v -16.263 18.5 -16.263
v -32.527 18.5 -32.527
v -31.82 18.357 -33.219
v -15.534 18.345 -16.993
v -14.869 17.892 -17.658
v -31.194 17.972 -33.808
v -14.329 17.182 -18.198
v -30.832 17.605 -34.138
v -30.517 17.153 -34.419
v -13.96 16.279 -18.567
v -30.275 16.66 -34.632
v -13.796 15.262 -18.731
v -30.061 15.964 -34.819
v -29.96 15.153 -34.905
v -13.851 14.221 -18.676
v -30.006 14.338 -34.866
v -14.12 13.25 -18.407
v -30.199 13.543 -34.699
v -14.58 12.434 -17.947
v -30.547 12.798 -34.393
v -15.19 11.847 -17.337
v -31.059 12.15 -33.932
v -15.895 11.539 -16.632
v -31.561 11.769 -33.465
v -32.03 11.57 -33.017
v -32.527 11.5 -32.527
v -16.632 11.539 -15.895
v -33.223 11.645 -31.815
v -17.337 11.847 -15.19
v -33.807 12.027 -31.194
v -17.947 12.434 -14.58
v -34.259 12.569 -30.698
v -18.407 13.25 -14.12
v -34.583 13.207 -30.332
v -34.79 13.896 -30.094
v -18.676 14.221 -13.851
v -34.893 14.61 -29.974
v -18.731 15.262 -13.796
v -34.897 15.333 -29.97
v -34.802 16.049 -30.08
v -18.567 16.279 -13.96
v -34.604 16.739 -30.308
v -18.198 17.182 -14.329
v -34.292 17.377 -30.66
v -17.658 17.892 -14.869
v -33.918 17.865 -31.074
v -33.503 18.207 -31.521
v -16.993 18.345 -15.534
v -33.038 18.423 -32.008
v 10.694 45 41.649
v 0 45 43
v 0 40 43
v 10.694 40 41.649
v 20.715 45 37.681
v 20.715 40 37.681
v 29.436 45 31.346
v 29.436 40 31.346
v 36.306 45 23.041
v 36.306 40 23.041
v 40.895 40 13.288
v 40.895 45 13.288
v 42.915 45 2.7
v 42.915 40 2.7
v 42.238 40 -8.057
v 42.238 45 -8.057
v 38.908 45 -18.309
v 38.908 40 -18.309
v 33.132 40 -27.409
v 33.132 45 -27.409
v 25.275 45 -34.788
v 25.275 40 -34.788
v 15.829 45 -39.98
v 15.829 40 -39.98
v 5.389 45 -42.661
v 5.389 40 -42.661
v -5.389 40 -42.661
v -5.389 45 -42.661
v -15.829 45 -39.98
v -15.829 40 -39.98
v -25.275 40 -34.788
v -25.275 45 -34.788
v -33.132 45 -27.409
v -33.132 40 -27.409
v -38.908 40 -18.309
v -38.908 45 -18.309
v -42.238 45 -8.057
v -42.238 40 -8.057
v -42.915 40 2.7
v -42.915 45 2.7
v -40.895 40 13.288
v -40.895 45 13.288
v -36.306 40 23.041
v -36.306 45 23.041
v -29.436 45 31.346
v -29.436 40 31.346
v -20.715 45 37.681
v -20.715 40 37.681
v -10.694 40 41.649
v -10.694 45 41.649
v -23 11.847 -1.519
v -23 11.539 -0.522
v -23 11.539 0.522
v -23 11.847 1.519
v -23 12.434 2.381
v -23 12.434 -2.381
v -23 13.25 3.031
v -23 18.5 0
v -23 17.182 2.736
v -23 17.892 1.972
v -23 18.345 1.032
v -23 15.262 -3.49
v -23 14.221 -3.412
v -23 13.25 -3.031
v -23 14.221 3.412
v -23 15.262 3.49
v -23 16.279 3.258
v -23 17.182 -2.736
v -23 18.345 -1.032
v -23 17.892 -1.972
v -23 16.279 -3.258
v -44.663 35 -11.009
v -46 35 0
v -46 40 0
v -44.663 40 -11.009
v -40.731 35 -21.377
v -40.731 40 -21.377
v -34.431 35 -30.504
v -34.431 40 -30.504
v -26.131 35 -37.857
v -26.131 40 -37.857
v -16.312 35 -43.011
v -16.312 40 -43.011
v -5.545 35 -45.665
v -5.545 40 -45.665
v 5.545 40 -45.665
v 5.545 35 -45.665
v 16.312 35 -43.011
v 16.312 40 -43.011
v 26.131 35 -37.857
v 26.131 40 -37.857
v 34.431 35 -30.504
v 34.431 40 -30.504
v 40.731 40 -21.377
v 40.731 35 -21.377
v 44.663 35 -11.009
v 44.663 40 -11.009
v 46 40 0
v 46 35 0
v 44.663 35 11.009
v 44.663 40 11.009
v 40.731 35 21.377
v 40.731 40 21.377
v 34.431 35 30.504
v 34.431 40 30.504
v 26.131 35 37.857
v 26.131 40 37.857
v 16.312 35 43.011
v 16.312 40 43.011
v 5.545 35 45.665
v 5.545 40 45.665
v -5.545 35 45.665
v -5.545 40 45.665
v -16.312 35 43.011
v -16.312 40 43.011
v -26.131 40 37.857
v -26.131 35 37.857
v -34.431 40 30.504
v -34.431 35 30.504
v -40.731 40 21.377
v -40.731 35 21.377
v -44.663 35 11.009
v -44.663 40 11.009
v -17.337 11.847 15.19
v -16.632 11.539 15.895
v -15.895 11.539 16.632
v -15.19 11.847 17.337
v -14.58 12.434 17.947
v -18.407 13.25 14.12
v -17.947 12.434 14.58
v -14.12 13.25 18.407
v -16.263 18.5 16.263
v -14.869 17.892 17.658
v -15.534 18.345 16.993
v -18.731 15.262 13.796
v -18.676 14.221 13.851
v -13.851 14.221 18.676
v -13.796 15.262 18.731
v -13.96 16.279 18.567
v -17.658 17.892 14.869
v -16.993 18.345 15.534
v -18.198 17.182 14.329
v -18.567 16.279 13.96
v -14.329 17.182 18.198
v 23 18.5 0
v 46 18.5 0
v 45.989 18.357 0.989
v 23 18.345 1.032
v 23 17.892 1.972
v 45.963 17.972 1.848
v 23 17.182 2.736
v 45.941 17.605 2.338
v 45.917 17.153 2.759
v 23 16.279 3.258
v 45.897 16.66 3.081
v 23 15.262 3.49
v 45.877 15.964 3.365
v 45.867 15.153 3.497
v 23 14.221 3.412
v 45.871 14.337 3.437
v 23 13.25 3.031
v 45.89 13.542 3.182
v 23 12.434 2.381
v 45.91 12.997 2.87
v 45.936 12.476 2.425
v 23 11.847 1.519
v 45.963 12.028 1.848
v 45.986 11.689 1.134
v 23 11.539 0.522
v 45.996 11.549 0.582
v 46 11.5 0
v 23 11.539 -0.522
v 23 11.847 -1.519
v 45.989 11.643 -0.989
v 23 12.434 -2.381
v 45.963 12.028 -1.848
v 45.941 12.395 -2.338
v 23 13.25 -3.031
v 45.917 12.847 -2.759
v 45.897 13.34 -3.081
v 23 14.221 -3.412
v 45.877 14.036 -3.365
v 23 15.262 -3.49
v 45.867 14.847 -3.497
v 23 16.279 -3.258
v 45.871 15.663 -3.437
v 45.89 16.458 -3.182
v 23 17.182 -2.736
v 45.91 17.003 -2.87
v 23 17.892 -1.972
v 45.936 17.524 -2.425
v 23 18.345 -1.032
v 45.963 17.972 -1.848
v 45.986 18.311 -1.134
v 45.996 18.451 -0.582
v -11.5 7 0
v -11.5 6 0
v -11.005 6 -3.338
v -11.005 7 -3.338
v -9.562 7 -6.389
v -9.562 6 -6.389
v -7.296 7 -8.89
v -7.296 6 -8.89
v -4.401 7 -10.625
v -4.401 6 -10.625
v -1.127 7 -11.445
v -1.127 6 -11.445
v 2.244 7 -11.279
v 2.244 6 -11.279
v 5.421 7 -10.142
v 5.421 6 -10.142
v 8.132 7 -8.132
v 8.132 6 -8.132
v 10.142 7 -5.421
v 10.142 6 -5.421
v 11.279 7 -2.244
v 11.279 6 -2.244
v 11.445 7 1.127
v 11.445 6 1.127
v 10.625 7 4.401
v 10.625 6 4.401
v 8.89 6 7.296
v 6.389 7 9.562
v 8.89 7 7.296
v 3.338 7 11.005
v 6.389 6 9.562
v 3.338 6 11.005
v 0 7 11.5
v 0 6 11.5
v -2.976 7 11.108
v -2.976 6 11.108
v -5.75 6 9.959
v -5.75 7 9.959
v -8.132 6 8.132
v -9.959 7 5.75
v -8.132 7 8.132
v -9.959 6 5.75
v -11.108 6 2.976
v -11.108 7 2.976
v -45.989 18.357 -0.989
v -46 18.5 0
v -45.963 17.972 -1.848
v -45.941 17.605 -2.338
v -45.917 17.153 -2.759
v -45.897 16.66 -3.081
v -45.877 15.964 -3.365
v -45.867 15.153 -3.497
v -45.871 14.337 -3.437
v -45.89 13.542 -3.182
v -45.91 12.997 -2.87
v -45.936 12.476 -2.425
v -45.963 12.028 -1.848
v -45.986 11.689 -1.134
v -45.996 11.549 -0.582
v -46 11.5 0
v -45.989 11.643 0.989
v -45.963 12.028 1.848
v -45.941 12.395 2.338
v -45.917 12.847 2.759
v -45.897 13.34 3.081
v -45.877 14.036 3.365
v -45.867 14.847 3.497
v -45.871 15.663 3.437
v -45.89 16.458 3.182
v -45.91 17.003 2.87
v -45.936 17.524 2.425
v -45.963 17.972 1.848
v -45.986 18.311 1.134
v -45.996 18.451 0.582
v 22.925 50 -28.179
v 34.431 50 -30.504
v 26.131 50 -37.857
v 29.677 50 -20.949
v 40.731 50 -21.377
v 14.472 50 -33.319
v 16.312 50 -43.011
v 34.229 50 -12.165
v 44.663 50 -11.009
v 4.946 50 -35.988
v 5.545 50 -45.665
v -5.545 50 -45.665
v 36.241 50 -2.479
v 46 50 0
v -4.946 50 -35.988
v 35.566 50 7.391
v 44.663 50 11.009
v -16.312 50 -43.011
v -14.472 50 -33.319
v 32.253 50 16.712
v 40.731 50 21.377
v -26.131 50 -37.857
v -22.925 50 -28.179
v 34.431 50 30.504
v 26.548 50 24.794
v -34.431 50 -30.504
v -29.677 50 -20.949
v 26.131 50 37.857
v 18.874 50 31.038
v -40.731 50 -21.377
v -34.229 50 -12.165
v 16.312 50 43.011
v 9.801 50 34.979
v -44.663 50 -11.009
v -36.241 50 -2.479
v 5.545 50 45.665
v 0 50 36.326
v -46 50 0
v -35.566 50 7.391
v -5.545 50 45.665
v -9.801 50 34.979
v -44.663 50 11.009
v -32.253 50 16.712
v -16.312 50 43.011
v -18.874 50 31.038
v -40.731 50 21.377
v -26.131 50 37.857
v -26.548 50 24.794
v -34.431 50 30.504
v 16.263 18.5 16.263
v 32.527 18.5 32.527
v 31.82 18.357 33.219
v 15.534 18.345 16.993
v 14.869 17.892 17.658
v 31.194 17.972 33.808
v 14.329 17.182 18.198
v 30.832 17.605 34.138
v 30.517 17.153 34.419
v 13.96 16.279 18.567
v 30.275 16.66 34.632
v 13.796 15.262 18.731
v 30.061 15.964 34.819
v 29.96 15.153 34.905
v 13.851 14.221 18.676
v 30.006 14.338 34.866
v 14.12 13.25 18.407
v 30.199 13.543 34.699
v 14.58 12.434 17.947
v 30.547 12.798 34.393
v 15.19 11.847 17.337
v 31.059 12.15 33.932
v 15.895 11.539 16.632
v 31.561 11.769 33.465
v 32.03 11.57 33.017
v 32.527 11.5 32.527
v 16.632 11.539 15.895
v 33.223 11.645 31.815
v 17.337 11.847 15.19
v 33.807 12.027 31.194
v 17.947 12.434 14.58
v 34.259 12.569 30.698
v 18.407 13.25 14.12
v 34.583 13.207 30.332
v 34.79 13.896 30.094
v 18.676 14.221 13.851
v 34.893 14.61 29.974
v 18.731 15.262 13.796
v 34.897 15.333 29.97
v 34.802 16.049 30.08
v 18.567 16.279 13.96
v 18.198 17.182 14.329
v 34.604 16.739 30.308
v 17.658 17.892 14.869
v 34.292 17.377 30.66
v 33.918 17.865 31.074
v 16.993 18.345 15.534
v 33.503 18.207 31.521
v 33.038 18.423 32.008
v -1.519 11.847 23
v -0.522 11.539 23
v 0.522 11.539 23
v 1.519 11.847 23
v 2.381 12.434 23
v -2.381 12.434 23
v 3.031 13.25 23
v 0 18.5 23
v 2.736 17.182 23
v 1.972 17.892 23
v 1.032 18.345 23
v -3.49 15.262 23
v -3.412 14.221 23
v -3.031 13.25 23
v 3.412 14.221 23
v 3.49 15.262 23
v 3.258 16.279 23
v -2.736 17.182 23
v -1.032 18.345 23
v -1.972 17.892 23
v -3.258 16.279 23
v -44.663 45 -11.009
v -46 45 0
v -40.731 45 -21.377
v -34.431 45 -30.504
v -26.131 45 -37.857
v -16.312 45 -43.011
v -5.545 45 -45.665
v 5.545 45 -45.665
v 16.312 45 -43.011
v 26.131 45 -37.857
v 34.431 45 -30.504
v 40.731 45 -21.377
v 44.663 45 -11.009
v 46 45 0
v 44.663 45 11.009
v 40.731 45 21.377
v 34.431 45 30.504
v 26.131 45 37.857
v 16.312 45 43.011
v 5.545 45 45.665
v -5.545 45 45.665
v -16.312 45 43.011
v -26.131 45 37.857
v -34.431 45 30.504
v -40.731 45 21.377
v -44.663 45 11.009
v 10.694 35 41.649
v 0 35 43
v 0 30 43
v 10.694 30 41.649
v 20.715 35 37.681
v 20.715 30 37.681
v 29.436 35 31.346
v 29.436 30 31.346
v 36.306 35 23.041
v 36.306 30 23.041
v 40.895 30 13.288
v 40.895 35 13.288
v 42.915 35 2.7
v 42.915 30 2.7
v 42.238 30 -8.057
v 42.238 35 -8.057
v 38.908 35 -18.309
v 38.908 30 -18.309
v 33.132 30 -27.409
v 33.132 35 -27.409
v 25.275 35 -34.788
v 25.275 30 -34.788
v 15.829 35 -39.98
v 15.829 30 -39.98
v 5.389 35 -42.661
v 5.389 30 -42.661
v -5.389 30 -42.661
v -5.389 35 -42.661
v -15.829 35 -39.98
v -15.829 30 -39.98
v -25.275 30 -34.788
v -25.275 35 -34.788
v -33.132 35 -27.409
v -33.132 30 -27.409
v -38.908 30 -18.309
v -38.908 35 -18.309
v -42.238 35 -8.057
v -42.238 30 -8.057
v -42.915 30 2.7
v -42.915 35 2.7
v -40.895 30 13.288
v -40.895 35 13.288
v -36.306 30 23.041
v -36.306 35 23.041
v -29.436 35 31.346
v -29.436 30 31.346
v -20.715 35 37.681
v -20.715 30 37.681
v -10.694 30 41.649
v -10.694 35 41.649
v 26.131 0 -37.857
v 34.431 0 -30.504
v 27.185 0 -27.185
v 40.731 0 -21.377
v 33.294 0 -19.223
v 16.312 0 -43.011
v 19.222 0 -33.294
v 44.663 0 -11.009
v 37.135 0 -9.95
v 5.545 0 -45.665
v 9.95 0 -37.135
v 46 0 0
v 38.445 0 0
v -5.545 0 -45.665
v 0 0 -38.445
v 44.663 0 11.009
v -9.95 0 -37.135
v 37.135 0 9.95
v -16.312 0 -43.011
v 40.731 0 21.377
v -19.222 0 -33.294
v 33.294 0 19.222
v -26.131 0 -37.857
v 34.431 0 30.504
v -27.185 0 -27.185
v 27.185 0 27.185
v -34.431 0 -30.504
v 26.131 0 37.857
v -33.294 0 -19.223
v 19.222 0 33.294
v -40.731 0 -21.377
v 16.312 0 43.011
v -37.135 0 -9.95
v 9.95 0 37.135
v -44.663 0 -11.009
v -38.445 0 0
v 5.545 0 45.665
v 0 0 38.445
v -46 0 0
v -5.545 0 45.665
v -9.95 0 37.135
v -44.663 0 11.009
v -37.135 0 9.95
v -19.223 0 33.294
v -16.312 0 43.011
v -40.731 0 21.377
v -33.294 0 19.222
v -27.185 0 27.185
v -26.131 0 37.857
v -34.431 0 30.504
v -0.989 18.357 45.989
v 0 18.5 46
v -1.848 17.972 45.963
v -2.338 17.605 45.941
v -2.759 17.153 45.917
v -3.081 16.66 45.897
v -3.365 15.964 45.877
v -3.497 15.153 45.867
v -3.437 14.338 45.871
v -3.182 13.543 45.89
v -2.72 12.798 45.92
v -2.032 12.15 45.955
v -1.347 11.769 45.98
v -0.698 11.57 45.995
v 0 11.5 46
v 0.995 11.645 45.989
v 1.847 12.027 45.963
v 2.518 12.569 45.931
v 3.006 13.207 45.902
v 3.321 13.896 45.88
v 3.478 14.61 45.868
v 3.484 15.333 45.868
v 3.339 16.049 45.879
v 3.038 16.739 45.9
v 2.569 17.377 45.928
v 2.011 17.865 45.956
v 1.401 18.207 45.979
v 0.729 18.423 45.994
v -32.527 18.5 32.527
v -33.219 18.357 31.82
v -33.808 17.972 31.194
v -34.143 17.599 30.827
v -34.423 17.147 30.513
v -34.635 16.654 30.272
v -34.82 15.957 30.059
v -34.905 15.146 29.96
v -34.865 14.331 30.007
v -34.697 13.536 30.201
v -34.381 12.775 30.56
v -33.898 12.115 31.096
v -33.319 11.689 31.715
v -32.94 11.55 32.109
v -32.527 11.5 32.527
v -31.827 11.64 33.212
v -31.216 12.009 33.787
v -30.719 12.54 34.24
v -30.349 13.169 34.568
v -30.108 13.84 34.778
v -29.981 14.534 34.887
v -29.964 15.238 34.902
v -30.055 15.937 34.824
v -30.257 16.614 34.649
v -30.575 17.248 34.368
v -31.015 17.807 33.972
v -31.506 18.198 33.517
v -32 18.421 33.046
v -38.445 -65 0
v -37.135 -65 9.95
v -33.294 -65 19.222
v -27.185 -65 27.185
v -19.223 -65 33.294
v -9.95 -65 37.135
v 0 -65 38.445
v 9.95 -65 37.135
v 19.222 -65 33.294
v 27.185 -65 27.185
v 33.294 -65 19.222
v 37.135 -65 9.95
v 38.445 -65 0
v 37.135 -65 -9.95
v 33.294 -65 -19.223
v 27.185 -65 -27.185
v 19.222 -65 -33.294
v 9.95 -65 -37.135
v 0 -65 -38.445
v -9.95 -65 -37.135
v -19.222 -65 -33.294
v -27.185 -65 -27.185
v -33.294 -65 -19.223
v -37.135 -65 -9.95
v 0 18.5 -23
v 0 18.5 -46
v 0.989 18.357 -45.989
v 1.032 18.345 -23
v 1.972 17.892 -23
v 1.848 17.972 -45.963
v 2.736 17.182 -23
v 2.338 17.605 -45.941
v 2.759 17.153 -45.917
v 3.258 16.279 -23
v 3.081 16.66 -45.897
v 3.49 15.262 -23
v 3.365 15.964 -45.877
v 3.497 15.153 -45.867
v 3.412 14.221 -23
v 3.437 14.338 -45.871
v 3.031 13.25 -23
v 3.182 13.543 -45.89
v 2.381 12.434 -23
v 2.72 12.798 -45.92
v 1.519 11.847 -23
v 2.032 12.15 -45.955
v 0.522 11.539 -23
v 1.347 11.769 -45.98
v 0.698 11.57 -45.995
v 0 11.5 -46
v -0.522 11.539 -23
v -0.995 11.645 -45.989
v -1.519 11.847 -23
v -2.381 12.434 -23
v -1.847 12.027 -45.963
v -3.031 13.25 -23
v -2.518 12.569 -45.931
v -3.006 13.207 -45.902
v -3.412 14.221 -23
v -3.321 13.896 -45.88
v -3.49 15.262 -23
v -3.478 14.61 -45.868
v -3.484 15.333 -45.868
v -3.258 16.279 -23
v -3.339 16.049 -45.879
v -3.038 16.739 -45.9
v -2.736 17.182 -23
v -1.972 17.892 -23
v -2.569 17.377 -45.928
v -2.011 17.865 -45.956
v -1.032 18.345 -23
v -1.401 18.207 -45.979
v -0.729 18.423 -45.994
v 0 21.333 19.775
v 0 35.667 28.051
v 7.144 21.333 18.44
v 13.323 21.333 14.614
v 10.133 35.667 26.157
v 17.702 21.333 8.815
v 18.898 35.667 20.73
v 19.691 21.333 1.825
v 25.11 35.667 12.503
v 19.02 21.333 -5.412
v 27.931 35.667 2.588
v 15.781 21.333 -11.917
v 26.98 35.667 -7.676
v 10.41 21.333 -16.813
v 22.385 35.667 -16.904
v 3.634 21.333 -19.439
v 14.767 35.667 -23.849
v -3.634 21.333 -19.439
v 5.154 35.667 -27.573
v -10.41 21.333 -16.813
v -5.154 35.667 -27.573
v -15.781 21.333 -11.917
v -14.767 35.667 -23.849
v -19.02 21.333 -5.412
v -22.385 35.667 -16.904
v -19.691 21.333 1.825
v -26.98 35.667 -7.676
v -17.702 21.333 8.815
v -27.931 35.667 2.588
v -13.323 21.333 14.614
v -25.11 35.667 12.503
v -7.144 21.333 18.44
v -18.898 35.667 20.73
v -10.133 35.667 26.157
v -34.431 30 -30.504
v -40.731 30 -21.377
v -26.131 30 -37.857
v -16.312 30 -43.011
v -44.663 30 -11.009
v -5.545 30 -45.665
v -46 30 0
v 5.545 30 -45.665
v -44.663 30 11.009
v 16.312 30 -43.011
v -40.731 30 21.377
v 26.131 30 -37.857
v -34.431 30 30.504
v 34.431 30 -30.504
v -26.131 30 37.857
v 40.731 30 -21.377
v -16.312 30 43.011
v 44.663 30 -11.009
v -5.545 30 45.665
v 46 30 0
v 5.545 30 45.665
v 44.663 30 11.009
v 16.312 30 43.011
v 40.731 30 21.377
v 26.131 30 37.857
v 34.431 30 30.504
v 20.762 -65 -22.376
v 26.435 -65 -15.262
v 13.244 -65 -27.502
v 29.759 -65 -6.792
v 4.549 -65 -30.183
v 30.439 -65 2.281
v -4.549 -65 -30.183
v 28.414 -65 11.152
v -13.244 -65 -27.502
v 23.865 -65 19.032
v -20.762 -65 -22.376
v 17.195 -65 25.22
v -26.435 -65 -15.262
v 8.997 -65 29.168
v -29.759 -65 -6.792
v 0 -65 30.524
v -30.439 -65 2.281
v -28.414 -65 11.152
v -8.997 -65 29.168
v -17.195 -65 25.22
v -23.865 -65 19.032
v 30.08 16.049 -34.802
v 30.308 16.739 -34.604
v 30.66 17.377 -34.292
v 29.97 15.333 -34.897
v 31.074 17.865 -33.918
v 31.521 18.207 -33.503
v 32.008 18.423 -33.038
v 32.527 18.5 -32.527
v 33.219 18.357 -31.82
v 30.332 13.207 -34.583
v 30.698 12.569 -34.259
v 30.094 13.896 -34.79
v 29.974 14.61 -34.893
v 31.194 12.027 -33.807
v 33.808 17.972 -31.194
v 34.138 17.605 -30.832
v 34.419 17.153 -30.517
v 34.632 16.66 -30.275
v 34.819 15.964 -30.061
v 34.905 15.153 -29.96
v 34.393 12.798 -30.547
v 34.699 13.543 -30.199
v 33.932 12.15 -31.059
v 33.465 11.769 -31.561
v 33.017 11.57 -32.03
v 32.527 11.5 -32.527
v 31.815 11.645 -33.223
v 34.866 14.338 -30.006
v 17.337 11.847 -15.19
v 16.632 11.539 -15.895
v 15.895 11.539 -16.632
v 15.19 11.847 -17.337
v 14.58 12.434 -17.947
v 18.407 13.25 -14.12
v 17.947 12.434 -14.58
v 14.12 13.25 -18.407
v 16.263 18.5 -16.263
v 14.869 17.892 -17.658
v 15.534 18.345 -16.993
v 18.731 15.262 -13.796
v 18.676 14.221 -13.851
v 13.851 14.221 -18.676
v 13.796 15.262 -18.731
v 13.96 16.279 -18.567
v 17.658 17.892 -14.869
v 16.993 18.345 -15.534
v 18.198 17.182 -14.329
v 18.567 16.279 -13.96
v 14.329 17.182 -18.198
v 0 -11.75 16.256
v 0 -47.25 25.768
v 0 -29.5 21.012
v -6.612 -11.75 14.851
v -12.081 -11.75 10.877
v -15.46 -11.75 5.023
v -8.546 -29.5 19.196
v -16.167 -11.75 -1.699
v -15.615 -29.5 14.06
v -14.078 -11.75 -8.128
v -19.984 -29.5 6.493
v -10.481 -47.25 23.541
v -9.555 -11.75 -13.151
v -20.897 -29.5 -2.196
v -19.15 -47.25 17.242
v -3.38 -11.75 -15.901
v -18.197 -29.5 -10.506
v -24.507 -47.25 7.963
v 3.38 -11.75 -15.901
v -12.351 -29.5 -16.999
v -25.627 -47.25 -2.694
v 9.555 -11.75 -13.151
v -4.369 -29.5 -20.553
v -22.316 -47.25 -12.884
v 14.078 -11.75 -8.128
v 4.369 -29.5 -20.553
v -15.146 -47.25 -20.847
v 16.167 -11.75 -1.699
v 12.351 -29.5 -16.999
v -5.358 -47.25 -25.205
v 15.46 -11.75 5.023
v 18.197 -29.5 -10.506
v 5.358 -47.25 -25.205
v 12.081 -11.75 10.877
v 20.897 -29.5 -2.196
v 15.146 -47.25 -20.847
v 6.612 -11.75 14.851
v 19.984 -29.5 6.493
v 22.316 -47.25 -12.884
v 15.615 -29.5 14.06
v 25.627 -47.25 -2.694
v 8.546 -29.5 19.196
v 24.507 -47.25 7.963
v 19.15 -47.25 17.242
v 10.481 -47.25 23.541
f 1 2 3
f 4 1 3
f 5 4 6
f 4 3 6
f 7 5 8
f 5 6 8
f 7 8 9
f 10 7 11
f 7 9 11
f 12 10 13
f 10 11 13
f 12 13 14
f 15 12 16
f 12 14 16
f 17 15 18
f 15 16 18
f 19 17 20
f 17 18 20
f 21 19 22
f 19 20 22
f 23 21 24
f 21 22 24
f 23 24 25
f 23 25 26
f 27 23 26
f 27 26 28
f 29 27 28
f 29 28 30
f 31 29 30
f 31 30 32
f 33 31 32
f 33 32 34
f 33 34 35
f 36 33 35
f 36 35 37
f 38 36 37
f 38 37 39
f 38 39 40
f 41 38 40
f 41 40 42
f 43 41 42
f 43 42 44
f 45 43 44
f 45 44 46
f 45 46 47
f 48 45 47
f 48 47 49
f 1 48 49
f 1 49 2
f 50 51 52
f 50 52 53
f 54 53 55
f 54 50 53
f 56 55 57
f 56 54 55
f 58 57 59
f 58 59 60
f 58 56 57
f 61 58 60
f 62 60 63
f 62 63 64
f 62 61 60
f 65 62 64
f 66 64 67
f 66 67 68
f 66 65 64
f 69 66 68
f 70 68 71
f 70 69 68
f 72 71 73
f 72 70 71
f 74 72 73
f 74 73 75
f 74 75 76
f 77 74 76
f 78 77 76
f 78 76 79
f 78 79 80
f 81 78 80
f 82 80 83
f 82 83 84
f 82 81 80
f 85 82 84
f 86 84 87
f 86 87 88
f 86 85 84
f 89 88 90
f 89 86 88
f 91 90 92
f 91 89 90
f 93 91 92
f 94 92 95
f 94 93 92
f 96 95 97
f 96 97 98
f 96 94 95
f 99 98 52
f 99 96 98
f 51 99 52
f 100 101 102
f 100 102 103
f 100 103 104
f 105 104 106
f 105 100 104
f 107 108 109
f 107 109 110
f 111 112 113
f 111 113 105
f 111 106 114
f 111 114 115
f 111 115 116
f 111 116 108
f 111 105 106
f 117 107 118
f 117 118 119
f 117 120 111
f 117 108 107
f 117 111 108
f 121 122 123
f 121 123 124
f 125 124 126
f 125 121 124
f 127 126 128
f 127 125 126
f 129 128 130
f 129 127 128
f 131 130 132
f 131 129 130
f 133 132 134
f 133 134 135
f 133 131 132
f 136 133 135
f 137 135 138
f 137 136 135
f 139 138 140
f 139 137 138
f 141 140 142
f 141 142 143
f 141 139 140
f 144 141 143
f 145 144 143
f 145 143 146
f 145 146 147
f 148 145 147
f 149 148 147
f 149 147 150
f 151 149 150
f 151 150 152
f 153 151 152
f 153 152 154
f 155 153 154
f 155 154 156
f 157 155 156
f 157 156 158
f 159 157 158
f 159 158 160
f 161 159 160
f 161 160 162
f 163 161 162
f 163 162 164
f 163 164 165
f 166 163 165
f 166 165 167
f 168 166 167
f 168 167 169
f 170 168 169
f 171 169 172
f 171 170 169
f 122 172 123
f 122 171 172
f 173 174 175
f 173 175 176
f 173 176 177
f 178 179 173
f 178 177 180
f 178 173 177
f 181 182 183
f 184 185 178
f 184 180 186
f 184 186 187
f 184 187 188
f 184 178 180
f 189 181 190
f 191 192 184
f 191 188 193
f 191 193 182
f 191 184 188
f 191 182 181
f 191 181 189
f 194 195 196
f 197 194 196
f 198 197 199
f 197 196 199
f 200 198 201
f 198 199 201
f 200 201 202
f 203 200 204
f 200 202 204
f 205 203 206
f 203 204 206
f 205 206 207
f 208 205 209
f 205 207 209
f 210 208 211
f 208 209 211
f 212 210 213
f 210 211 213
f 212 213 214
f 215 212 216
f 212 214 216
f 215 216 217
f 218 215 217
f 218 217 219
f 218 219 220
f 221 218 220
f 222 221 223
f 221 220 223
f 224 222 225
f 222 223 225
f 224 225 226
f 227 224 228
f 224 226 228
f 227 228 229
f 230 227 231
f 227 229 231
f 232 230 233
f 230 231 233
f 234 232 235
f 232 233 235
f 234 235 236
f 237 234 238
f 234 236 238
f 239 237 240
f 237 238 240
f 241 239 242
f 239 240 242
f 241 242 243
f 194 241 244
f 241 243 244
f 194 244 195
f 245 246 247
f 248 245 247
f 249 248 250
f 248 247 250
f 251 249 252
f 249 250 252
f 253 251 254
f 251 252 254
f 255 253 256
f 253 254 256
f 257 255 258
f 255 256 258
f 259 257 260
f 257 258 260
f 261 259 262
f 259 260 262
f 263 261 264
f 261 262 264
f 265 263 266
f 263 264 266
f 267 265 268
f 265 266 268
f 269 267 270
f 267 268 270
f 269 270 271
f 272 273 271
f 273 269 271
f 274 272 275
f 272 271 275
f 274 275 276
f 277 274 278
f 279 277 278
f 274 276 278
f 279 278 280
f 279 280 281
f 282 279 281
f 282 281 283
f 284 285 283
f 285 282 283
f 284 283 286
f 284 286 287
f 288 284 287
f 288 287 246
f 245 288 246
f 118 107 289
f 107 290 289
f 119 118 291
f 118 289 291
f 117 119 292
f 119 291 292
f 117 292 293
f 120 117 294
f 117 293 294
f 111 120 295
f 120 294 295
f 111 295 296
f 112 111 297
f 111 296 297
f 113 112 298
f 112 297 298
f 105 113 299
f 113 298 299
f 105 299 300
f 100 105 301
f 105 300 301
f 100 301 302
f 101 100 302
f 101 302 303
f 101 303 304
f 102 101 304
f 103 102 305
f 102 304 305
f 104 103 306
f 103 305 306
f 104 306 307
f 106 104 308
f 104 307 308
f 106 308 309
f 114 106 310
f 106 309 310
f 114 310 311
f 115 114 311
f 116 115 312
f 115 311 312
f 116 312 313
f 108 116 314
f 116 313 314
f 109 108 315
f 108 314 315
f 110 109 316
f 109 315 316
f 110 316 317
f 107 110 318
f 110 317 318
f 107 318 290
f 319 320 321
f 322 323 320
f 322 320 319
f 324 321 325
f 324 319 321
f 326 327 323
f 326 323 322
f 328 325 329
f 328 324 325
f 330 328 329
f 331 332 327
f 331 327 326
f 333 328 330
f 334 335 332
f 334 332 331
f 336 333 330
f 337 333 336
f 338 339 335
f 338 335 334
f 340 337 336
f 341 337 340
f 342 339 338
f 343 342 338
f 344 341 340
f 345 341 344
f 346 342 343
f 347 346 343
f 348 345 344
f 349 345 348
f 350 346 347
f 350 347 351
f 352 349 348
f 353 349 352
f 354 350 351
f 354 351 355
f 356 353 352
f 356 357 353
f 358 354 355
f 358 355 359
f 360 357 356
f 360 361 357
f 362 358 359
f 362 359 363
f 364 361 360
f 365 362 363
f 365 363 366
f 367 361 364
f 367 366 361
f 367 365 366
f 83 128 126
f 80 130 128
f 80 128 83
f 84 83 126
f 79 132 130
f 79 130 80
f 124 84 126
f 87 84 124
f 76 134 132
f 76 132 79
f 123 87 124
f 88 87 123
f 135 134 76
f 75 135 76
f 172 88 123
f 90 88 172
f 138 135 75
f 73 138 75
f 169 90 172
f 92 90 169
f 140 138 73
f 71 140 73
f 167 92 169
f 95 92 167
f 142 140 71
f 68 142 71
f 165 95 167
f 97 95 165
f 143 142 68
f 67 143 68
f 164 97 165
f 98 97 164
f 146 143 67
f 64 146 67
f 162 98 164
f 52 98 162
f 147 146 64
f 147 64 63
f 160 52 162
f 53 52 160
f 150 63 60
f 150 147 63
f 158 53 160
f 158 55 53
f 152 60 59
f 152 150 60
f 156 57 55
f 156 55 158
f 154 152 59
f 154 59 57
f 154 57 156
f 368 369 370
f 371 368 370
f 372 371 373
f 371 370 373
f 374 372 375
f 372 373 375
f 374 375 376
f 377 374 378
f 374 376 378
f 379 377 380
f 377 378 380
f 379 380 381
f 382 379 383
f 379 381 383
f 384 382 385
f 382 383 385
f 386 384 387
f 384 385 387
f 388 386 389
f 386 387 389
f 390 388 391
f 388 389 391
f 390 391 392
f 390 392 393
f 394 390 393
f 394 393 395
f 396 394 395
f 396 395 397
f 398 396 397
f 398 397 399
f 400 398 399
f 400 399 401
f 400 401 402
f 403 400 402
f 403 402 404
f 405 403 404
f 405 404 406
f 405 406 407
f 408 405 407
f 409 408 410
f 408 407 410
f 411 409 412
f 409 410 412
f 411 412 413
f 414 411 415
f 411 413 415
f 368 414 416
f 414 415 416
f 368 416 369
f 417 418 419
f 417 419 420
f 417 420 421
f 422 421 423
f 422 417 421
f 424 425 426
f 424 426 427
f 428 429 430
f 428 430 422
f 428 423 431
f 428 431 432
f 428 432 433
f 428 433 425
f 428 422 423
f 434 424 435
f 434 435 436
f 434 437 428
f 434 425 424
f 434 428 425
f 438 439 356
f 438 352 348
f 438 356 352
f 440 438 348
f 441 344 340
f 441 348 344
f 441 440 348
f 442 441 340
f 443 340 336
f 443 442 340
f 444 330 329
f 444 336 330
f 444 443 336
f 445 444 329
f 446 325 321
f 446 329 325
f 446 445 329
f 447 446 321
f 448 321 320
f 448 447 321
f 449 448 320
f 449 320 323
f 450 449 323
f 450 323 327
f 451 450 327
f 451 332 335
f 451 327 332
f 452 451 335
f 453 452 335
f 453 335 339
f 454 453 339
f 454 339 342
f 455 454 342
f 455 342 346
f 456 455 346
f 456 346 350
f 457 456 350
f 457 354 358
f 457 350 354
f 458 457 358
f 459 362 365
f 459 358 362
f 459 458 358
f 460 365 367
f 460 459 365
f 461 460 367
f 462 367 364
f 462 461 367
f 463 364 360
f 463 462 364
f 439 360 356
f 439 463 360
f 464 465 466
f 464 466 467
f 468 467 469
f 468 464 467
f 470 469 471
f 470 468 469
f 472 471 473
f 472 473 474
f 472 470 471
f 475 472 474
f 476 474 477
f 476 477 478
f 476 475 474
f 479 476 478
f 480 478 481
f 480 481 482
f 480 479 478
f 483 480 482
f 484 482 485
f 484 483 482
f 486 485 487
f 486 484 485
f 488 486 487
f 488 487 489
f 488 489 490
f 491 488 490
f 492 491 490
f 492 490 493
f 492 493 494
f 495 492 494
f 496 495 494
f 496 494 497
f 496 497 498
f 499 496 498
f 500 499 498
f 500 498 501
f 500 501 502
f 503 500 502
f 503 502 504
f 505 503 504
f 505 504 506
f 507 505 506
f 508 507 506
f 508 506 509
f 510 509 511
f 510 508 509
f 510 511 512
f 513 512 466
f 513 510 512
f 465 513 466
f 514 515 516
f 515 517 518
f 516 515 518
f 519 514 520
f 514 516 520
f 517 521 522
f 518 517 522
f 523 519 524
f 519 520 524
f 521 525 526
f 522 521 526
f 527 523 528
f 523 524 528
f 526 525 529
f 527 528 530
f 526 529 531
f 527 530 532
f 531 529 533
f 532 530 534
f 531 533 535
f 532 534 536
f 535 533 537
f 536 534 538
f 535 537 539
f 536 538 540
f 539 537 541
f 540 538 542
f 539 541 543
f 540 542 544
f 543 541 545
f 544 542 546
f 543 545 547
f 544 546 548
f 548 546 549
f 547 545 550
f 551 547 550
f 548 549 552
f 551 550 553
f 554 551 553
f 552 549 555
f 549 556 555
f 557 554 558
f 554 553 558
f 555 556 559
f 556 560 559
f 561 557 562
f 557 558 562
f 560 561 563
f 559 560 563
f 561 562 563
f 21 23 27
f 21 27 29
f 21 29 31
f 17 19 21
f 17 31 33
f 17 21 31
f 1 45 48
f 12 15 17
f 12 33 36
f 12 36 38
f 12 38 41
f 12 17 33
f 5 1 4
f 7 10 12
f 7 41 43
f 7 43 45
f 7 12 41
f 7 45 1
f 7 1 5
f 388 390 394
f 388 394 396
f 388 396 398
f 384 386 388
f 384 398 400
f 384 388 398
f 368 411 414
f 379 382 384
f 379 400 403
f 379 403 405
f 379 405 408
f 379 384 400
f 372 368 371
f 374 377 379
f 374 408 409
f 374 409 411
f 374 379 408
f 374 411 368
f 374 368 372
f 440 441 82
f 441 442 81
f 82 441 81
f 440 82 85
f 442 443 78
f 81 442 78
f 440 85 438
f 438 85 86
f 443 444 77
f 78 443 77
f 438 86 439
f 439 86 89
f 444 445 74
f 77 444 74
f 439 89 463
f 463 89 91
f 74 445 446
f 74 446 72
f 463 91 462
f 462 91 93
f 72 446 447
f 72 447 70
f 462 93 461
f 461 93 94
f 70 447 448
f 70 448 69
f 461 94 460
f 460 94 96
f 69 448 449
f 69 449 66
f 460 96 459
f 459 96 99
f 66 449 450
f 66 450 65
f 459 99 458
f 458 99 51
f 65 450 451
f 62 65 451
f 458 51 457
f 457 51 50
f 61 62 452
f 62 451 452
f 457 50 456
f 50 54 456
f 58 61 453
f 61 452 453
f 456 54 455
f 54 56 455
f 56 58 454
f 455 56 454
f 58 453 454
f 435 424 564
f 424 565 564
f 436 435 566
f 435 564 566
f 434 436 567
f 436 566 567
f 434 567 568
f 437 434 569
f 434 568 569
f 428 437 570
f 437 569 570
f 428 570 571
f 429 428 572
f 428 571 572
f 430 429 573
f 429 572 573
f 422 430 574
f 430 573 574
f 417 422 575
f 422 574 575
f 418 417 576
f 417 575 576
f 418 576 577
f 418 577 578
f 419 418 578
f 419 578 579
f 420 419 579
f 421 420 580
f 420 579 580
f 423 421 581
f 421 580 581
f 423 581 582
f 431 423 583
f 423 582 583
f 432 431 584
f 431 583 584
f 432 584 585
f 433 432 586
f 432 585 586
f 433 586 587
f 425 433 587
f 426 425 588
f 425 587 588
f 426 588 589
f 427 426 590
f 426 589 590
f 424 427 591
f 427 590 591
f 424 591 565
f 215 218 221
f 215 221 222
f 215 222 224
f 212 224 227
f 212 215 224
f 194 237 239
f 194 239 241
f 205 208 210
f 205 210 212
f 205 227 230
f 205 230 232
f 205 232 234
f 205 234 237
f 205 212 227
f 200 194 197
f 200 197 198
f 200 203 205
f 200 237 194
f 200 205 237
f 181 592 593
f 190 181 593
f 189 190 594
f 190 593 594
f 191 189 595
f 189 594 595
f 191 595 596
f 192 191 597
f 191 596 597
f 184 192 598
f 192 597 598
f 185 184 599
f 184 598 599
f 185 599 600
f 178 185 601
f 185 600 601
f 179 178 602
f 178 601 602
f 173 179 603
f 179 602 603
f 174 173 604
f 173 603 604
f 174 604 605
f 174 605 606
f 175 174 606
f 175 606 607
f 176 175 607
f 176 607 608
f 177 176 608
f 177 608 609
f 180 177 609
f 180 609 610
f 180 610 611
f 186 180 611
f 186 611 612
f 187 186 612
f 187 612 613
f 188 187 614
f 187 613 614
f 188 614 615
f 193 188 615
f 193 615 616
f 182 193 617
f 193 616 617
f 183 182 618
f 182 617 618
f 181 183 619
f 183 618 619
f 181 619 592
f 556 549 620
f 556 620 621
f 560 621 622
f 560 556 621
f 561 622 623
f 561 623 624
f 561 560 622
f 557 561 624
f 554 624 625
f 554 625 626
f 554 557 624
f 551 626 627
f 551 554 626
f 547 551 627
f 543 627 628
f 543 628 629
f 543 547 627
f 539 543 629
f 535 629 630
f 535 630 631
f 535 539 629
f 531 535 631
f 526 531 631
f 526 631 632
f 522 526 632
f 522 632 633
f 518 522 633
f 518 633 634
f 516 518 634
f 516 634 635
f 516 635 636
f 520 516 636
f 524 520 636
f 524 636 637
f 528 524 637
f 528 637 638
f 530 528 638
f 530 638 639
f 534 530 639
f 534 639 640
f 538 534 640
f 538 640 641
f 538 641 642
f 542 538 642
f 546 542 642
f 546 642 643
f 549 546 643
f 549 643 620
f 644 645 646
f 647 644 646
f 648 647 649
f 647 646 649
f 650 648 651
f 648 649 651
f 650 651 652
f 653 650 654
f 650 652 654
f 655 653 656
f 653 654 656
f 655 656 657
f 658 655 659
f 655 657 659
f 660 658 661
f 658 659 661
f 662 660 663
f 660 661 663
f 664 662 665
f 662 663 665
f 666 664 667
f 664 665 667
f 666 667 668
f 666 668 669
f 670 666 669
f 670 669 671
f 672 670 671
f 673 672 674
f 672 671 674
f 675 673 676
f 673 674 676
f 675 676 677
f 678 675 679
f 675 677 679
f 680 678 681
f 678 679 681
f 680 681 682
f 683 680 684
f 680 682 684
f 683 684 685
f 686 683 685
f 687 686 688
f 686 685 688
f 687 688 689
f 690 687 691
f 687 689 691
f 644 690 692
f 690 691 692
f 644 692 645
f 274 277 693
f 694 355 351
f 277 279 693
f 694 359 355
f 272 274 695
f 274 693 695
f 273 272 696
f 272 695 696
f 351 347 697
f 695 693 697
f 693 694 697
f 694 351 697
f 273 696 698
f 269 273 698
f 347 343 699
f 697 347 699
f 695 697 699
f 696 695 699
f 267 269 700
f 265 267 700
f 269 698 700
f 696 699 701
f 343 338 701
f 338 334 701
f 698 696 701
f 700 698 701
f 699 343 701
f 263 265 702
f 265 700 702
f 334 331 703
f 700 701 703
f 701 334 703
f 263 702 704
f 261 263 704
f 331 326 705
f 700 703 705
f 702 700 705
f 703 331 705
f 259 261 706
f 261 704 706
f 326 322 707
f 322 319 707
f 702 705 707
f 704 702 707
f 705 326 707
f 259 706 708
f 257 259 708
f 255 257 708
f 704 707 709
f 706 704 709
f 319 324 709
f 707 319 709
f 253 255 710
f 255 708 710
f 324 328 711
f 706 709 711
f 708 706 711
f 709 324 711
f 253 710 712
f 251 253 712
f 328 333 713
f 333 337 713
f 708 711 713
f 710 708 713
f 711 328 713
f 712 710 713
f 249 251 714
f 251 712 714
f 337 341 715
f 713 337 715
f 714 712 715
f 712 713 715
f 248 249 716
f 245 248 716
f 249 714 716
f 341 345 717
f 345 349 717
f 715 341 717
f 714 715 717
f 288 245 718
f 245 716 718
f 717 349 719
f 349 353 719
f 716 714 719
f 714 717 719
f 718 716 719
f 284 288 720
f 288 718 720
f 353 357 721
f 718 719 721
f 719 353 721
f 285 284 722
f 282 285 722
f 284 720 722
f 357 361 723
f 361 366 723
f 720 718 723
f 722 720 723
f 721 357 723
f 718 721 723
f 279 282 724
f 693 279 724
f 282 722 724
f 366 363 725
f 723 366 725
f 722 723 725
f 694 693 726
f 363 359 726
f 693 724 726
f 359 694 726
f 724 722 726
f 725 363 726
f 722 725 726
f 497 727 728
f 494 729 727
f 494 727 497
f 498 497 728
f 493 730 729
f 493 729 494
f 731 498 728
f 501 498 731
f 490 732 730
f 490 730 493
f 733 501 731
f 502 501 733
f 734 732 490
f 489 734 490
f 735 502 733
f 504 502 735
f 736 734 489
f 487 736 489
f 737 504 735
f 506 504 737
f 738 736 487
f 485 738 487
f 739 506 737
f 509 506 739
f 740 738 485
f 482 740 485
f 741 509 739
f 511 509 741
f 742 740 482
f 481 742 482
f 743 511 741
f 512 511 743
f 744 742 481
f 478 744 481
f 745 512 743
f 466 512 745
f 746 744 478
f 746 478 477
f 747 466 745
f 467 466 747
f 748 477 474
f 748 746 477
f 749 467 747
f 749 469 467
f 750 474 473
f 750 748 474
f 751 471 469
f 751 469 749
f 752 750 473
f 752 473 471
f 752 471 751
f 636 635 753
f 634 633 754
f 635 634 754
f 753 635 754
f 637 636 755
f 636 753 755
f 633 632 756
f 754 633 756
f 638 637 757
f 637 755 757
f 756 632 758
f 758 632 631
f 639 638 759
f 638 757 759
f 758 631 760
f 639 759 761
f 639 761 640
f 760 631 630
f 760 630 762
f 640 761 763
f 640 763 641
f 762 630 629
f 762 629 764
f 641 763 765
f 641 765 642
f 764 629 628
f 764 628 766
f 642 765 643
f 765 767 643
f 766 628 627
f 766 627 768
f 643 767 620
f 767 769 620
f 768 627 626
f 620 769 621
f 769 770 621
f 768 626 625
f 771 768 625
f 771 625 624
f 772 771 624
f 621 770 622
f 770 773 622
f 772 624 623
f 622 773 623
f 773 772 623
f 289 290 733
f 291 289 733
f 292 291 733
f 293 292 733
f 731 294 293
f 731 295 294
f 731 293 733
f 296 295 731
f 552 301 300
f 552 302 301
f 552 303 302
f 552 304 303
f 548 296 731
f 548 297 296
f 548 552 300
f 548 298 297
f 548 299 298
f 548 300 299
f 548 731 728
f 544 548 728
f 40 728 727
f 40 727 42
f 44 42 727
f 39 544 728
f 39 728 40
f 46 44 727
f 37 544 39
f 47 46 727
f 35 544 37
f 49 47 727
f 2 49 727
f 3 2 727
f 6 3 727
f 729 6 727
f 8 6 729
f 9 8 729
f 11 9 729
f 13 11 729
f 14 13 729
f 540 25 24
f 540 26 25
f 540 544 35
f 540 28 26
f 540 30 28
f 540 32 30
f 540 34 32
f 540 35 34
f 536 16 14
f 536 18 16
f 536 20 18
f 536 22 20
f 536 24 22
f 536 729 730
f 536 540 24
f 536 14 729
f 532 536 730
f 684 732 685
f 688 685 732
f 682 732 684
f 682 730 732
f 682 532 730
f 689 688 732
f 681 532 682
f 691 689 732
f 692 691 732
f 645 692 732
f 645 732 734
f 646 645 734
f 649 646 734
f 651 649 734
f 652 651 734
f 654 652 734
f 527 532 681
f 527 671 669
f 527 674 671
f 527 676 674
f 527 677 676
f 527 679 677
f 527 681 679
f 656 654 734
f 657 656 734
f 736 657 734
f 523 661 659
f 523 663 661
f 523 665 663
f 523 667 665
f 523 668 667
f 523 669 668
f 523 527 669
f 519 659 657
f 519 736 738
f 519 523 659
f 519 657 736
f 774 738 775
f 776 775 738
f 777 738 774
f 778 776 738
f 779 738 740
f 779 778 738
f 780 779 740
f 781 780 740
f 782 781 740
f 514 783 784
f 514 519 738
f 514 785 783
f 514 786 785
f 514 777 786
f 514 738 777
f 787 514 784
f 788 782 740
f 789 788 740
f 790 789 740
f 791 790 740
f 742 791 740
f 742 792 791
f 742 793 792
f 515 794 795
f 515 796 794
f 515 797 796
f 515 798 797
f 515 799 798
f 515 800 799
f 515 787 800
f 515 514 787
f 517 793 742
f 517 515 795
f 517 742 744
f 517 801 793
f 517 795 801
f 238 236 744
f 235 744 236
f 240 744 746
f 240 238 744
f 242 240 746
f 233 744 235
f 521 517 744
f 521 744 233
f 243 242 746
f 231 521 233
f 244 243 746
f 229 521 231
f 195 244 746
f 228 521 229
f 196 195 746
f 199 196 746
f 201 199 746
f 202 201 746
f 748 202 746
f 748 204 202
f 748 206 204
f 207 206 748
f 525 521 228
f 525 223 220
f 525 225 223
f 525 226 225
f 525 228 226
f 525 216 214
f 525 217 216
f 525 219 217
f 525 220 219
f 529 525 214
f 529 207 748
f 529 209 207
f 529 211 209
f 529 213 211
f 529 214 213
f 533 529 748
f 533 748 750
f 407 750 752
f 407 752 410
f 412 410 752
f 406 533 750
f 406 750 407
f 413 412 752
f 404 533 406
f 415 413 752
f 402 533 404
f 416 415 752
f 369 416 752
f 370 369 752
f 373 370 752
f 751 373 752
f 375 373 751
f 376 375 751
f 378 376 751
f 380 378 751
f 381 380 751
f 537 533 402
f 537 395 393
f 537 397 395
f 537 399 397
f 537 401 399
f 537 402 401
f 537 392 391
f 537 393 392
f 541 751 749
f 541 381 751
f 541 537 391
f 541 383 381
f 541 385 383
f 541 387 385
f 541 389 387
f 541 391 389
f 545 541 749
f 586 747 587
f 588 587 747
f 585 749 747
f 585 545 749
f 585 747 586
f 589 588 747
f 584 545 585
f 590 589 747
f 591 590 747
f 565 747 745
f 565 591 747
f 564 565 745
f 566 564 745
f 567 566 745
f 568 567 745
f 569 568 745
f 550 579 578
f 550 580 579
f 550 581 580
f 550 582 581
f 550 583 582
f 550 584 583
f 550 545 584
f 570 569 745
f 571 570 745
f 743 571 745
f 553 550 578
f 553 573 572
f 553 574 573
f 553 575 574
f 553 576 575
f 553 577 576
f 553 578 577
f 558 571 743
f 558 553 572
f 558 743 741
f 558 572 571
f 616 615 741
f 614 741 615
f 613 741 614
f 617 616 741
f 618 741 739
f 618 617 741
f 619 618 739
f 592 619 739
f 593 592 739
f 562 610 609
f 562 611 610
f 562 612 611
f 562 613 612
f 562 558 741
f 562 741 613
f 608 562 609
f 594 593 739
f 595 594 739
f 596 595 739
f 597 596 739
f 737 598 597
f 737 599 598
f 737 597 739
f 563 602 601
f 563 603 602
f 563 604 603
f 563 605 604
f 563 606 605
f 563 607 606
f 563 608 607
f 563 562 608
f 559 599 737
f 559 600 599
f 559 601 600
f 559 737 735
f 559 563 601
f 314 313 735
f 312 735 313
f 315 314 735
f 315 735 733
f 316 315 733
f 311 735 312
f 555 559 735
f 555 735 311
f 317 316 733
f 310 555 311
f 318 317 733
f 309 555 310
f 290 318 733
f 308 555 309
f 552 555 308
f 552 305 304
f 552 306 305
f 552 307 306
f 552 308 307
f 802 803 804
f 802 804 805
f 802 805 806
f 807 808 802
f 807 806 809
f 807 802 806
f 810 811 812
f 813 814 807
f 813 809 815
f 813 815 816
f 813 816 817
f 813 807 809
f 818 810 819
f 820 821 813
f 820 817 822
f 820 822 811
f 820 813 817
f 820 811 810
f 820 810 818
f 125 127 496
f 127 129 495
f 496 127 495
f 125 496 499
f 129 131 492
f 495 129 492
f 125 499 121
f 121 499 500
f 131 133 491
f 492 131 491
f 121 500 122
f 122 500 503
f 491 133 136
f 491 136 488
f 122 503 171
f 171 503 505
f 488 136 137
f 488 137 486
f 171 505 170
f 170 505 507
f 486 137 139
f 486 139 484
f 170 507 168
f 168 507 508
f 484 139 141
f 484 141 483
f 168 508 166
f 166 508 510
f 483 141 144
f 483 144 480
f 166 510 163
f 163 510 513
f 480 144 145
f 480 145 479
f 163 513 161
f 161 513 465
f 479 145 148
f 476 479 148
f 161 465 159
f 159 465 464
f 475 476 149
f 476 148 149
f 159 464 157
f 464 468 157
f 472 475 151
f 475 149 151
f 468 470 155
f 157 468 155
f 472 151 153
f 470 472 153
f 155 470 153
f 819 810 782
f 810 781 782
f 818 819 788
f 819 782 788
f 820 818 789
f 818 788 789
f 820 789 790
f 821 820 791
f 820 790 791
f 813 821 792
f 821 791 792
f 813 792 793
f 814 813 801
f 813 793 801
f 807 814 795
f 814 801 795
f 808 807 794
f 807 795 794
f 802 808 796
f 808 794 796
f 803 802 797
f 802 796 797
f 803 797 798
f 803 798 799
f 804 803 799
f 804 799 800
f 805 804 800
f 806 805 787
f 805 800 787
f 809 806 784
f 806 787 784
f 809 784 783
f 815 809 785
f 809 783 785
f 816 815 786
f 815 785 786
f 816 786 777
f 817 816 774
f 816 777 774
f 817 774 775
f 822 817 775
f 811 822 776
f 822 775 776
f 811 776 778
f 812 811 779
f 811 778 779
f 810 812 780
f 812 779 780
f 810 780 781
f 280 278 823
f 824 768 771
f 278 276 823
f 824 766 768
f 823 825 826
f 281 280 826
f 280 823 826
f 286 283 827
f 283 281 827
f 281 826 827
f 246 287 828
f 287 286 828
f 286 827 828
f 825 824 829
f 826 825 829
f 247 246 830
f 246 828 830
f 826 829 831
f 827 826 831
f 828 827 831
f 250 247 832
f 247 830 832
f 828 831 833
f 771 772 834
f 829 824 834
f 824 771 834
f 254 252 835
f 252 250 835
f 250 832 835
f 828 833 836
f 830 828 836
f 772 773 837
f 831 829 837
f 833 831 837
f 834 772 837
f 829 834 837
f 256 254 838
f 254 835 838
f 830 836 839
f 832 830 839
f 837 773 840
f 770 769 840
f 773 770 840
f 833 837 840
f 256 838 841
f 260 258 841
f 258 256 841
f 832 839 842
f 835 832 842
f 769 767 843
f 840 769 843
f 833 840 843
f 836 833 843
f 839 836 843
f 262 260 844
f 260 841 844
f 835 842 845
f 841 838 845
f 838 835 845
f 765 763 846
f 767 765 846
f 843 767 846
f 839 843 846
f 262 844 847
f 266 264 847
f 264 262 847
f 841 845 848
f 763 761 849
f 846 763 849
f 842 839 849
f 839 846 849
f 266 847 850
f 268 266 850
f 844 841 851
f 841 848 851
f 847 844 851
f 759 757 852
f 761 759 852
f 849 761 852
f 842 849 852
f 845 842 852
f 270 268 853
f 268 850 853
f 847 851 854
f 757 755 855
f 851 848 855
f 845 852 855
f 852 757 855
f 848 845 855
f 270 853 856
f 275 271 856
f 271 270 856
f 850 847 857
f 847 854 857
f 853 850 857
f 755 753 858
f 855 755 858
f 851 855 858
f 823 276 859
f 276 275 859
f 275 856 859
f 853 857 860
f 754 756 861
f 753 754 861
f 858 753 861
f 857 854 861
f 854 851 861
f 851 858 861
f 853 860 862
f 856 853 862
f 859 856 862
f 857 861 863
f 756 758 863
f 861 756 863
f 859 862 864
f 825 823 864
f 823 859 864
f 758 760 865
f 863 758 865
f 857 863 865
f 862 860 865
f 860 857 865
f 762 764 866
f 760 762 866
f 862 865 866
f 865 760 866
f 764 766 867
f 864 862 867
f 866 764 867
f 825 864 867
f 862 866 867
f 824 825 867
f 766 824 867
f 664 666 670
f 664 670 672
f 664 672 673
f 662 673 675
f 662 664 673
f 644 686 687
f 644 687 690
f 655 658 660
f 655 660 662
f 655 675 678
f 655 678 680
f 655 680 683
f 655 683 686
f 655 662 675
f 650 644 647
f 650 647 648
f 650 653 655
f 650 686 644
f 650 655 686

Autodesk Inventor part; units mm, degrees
ref_plane "XZ Plane" through (0, 0, 0) normal (0, 1, 0) x (-1, 0, 0)
ref_plane "XY Plane" through (0, 0, 0) normal (0, 0, 1) x (1, 0, 0)
sketch "Sketch1" plane through (0, 0, 0) normal (0, 1, 0) x (-1, 0, 0)
  circle A0 centre (0, 0) radius 46
  circle A1 centre (0, 0) radius 38.445
  circle A2 centre (0, 0) radius 11.5
  dimension "d0" = 92
  dimension "d1" = 76.89
  dimension "d2" = 23
extrude "Extrusion1" add sketch "Sketch1" against normal blind 65 contours A1
extrude "Extrusion2" add sketch "Sketch1" along normal blind 50 contours A0 | A1
sketch "Sketch2" plane through (0, 0, 0) normal (1, 0, 0) x (0, 1, 0)
  line L0 (50, -46) -> (50, 46) projected
  line L1 (0, -46) -> (0, 46) projected
  line L2 (-65, 38.445) -> (-65, -38.445) projected
  line L3 (0, -38.445) -> (0, 38.445) projected
  line L4 (0, -46) -> (0, -38.445) projected
  line L5 (0, -38.445) -> (-65, -38.445) projected
  line L6 (-65, -38.445) -> (-65, -11.5) projected
  line L7 (-65, -11.5) -> (50, -11.5) projected
  line L8 (50, -11.5) -> (50, -46) projected
  line L9 (0, 38.445) -> (0, 46) projected
  line L10 (50, 46) -> (50, 11.5) projected
  line L11 (50, 11.5) -> (-65, 11.5) projected
  line L12 (-65, 11.5) -> (-65, 38.445) projected
  line L13 (-65, 38.445) -> (0, 38.445) projected
  line L14 (45, 46) -> (40, 46)
  line L15 (40, 46) -> (40, 43)
  line L16 (40, 43) -> (45, 43)
  line L17 (45, 43) -> (45, 46)
  line L18 (35, 46) -> (30, 46)
  line L19 (30, 46) -> (30, 43)
  line L20 (30, 43) -> (35, 43)
  line L21 (35, 43) -> (35, 46)
  line L22 (-65, 11.5) -> (50, 11.5) projected
  line L23 (6, -11.5) -> (6, 11.5)
  line L24 (6, 11.5) -> (-65, 30.5244)
  line L25 (-88, 0) -> (73, 0) projected
  line L26 (-65, 30.5244) -> (-65, 0)
  line L27 (-65, 0) -> (6, 0)
  line L28 (7, 11.5) -> (7, -11.5)
  line L29 (7, 11.5) -> (50, 36.3261)
  line L30 (50, 36.3261) -> (50, 0)
  line L31 (7, 0) -> (50, 0)
  line L32 (50, -46) -> (0, -46) projected
  line L33 (0, 46) -> (50, 46) projected
  point P0 (0, 0)
  point P1 (30, 46)
  point P2 (0, 13.1077)
  point P3 (0, 0)
  dimension "d11" = 5
  dimension "d12" = 5
  dimension "d13" = 5
  dimension "d14" = 5
  dimension "d15" = 3
  dimension "d16" = 71
  dimension "d17" = 15
  dimension "d18" = 1
  dimension "d19" = 30
revolve "Revolution1" cut sketch "Sketch2" angle 360 about axis through (0, -10, 0) along (0, 1, 0) contours L25 L28 L11 L0 | L11 L29 L0 | L25 L1 L11 L23 | L25 L2 L11 L1 | L11 L1 L24 | L11 L2 L24 L1 | L17 L16 L15 L14 | L21 L20 L19 L18
ref_plane "Work Plane1" through (46, 0, 0) normal (1, 0, 0) x (0, 1, 0)
sketch "Sketch3" plane through (46, 0, 0) normal (1, 0, 0) x (0, 1, 0)
  line L0 (45, 0) -> (50, 0) projected
  line L1 (35, 0) -> (40, 0) projected
  line L2 (0, 0) -> (30, 0) projected
  circle A0 centre (15, 0) radius 3.5
  line L3 (0, -46) -> (0, 46) projected
  dimension "d23" = 7
  dimension "d24" = 15
extrude "Extrusion3" cut sketch "Sketch3" against normal blind 23
pattern_circular "Circular Pattern1" count 8 over 360 about axis through (0, 0, 0) along (0, 1, 0) of "Extrusion3"
properties part number "nozzle 94mm"
